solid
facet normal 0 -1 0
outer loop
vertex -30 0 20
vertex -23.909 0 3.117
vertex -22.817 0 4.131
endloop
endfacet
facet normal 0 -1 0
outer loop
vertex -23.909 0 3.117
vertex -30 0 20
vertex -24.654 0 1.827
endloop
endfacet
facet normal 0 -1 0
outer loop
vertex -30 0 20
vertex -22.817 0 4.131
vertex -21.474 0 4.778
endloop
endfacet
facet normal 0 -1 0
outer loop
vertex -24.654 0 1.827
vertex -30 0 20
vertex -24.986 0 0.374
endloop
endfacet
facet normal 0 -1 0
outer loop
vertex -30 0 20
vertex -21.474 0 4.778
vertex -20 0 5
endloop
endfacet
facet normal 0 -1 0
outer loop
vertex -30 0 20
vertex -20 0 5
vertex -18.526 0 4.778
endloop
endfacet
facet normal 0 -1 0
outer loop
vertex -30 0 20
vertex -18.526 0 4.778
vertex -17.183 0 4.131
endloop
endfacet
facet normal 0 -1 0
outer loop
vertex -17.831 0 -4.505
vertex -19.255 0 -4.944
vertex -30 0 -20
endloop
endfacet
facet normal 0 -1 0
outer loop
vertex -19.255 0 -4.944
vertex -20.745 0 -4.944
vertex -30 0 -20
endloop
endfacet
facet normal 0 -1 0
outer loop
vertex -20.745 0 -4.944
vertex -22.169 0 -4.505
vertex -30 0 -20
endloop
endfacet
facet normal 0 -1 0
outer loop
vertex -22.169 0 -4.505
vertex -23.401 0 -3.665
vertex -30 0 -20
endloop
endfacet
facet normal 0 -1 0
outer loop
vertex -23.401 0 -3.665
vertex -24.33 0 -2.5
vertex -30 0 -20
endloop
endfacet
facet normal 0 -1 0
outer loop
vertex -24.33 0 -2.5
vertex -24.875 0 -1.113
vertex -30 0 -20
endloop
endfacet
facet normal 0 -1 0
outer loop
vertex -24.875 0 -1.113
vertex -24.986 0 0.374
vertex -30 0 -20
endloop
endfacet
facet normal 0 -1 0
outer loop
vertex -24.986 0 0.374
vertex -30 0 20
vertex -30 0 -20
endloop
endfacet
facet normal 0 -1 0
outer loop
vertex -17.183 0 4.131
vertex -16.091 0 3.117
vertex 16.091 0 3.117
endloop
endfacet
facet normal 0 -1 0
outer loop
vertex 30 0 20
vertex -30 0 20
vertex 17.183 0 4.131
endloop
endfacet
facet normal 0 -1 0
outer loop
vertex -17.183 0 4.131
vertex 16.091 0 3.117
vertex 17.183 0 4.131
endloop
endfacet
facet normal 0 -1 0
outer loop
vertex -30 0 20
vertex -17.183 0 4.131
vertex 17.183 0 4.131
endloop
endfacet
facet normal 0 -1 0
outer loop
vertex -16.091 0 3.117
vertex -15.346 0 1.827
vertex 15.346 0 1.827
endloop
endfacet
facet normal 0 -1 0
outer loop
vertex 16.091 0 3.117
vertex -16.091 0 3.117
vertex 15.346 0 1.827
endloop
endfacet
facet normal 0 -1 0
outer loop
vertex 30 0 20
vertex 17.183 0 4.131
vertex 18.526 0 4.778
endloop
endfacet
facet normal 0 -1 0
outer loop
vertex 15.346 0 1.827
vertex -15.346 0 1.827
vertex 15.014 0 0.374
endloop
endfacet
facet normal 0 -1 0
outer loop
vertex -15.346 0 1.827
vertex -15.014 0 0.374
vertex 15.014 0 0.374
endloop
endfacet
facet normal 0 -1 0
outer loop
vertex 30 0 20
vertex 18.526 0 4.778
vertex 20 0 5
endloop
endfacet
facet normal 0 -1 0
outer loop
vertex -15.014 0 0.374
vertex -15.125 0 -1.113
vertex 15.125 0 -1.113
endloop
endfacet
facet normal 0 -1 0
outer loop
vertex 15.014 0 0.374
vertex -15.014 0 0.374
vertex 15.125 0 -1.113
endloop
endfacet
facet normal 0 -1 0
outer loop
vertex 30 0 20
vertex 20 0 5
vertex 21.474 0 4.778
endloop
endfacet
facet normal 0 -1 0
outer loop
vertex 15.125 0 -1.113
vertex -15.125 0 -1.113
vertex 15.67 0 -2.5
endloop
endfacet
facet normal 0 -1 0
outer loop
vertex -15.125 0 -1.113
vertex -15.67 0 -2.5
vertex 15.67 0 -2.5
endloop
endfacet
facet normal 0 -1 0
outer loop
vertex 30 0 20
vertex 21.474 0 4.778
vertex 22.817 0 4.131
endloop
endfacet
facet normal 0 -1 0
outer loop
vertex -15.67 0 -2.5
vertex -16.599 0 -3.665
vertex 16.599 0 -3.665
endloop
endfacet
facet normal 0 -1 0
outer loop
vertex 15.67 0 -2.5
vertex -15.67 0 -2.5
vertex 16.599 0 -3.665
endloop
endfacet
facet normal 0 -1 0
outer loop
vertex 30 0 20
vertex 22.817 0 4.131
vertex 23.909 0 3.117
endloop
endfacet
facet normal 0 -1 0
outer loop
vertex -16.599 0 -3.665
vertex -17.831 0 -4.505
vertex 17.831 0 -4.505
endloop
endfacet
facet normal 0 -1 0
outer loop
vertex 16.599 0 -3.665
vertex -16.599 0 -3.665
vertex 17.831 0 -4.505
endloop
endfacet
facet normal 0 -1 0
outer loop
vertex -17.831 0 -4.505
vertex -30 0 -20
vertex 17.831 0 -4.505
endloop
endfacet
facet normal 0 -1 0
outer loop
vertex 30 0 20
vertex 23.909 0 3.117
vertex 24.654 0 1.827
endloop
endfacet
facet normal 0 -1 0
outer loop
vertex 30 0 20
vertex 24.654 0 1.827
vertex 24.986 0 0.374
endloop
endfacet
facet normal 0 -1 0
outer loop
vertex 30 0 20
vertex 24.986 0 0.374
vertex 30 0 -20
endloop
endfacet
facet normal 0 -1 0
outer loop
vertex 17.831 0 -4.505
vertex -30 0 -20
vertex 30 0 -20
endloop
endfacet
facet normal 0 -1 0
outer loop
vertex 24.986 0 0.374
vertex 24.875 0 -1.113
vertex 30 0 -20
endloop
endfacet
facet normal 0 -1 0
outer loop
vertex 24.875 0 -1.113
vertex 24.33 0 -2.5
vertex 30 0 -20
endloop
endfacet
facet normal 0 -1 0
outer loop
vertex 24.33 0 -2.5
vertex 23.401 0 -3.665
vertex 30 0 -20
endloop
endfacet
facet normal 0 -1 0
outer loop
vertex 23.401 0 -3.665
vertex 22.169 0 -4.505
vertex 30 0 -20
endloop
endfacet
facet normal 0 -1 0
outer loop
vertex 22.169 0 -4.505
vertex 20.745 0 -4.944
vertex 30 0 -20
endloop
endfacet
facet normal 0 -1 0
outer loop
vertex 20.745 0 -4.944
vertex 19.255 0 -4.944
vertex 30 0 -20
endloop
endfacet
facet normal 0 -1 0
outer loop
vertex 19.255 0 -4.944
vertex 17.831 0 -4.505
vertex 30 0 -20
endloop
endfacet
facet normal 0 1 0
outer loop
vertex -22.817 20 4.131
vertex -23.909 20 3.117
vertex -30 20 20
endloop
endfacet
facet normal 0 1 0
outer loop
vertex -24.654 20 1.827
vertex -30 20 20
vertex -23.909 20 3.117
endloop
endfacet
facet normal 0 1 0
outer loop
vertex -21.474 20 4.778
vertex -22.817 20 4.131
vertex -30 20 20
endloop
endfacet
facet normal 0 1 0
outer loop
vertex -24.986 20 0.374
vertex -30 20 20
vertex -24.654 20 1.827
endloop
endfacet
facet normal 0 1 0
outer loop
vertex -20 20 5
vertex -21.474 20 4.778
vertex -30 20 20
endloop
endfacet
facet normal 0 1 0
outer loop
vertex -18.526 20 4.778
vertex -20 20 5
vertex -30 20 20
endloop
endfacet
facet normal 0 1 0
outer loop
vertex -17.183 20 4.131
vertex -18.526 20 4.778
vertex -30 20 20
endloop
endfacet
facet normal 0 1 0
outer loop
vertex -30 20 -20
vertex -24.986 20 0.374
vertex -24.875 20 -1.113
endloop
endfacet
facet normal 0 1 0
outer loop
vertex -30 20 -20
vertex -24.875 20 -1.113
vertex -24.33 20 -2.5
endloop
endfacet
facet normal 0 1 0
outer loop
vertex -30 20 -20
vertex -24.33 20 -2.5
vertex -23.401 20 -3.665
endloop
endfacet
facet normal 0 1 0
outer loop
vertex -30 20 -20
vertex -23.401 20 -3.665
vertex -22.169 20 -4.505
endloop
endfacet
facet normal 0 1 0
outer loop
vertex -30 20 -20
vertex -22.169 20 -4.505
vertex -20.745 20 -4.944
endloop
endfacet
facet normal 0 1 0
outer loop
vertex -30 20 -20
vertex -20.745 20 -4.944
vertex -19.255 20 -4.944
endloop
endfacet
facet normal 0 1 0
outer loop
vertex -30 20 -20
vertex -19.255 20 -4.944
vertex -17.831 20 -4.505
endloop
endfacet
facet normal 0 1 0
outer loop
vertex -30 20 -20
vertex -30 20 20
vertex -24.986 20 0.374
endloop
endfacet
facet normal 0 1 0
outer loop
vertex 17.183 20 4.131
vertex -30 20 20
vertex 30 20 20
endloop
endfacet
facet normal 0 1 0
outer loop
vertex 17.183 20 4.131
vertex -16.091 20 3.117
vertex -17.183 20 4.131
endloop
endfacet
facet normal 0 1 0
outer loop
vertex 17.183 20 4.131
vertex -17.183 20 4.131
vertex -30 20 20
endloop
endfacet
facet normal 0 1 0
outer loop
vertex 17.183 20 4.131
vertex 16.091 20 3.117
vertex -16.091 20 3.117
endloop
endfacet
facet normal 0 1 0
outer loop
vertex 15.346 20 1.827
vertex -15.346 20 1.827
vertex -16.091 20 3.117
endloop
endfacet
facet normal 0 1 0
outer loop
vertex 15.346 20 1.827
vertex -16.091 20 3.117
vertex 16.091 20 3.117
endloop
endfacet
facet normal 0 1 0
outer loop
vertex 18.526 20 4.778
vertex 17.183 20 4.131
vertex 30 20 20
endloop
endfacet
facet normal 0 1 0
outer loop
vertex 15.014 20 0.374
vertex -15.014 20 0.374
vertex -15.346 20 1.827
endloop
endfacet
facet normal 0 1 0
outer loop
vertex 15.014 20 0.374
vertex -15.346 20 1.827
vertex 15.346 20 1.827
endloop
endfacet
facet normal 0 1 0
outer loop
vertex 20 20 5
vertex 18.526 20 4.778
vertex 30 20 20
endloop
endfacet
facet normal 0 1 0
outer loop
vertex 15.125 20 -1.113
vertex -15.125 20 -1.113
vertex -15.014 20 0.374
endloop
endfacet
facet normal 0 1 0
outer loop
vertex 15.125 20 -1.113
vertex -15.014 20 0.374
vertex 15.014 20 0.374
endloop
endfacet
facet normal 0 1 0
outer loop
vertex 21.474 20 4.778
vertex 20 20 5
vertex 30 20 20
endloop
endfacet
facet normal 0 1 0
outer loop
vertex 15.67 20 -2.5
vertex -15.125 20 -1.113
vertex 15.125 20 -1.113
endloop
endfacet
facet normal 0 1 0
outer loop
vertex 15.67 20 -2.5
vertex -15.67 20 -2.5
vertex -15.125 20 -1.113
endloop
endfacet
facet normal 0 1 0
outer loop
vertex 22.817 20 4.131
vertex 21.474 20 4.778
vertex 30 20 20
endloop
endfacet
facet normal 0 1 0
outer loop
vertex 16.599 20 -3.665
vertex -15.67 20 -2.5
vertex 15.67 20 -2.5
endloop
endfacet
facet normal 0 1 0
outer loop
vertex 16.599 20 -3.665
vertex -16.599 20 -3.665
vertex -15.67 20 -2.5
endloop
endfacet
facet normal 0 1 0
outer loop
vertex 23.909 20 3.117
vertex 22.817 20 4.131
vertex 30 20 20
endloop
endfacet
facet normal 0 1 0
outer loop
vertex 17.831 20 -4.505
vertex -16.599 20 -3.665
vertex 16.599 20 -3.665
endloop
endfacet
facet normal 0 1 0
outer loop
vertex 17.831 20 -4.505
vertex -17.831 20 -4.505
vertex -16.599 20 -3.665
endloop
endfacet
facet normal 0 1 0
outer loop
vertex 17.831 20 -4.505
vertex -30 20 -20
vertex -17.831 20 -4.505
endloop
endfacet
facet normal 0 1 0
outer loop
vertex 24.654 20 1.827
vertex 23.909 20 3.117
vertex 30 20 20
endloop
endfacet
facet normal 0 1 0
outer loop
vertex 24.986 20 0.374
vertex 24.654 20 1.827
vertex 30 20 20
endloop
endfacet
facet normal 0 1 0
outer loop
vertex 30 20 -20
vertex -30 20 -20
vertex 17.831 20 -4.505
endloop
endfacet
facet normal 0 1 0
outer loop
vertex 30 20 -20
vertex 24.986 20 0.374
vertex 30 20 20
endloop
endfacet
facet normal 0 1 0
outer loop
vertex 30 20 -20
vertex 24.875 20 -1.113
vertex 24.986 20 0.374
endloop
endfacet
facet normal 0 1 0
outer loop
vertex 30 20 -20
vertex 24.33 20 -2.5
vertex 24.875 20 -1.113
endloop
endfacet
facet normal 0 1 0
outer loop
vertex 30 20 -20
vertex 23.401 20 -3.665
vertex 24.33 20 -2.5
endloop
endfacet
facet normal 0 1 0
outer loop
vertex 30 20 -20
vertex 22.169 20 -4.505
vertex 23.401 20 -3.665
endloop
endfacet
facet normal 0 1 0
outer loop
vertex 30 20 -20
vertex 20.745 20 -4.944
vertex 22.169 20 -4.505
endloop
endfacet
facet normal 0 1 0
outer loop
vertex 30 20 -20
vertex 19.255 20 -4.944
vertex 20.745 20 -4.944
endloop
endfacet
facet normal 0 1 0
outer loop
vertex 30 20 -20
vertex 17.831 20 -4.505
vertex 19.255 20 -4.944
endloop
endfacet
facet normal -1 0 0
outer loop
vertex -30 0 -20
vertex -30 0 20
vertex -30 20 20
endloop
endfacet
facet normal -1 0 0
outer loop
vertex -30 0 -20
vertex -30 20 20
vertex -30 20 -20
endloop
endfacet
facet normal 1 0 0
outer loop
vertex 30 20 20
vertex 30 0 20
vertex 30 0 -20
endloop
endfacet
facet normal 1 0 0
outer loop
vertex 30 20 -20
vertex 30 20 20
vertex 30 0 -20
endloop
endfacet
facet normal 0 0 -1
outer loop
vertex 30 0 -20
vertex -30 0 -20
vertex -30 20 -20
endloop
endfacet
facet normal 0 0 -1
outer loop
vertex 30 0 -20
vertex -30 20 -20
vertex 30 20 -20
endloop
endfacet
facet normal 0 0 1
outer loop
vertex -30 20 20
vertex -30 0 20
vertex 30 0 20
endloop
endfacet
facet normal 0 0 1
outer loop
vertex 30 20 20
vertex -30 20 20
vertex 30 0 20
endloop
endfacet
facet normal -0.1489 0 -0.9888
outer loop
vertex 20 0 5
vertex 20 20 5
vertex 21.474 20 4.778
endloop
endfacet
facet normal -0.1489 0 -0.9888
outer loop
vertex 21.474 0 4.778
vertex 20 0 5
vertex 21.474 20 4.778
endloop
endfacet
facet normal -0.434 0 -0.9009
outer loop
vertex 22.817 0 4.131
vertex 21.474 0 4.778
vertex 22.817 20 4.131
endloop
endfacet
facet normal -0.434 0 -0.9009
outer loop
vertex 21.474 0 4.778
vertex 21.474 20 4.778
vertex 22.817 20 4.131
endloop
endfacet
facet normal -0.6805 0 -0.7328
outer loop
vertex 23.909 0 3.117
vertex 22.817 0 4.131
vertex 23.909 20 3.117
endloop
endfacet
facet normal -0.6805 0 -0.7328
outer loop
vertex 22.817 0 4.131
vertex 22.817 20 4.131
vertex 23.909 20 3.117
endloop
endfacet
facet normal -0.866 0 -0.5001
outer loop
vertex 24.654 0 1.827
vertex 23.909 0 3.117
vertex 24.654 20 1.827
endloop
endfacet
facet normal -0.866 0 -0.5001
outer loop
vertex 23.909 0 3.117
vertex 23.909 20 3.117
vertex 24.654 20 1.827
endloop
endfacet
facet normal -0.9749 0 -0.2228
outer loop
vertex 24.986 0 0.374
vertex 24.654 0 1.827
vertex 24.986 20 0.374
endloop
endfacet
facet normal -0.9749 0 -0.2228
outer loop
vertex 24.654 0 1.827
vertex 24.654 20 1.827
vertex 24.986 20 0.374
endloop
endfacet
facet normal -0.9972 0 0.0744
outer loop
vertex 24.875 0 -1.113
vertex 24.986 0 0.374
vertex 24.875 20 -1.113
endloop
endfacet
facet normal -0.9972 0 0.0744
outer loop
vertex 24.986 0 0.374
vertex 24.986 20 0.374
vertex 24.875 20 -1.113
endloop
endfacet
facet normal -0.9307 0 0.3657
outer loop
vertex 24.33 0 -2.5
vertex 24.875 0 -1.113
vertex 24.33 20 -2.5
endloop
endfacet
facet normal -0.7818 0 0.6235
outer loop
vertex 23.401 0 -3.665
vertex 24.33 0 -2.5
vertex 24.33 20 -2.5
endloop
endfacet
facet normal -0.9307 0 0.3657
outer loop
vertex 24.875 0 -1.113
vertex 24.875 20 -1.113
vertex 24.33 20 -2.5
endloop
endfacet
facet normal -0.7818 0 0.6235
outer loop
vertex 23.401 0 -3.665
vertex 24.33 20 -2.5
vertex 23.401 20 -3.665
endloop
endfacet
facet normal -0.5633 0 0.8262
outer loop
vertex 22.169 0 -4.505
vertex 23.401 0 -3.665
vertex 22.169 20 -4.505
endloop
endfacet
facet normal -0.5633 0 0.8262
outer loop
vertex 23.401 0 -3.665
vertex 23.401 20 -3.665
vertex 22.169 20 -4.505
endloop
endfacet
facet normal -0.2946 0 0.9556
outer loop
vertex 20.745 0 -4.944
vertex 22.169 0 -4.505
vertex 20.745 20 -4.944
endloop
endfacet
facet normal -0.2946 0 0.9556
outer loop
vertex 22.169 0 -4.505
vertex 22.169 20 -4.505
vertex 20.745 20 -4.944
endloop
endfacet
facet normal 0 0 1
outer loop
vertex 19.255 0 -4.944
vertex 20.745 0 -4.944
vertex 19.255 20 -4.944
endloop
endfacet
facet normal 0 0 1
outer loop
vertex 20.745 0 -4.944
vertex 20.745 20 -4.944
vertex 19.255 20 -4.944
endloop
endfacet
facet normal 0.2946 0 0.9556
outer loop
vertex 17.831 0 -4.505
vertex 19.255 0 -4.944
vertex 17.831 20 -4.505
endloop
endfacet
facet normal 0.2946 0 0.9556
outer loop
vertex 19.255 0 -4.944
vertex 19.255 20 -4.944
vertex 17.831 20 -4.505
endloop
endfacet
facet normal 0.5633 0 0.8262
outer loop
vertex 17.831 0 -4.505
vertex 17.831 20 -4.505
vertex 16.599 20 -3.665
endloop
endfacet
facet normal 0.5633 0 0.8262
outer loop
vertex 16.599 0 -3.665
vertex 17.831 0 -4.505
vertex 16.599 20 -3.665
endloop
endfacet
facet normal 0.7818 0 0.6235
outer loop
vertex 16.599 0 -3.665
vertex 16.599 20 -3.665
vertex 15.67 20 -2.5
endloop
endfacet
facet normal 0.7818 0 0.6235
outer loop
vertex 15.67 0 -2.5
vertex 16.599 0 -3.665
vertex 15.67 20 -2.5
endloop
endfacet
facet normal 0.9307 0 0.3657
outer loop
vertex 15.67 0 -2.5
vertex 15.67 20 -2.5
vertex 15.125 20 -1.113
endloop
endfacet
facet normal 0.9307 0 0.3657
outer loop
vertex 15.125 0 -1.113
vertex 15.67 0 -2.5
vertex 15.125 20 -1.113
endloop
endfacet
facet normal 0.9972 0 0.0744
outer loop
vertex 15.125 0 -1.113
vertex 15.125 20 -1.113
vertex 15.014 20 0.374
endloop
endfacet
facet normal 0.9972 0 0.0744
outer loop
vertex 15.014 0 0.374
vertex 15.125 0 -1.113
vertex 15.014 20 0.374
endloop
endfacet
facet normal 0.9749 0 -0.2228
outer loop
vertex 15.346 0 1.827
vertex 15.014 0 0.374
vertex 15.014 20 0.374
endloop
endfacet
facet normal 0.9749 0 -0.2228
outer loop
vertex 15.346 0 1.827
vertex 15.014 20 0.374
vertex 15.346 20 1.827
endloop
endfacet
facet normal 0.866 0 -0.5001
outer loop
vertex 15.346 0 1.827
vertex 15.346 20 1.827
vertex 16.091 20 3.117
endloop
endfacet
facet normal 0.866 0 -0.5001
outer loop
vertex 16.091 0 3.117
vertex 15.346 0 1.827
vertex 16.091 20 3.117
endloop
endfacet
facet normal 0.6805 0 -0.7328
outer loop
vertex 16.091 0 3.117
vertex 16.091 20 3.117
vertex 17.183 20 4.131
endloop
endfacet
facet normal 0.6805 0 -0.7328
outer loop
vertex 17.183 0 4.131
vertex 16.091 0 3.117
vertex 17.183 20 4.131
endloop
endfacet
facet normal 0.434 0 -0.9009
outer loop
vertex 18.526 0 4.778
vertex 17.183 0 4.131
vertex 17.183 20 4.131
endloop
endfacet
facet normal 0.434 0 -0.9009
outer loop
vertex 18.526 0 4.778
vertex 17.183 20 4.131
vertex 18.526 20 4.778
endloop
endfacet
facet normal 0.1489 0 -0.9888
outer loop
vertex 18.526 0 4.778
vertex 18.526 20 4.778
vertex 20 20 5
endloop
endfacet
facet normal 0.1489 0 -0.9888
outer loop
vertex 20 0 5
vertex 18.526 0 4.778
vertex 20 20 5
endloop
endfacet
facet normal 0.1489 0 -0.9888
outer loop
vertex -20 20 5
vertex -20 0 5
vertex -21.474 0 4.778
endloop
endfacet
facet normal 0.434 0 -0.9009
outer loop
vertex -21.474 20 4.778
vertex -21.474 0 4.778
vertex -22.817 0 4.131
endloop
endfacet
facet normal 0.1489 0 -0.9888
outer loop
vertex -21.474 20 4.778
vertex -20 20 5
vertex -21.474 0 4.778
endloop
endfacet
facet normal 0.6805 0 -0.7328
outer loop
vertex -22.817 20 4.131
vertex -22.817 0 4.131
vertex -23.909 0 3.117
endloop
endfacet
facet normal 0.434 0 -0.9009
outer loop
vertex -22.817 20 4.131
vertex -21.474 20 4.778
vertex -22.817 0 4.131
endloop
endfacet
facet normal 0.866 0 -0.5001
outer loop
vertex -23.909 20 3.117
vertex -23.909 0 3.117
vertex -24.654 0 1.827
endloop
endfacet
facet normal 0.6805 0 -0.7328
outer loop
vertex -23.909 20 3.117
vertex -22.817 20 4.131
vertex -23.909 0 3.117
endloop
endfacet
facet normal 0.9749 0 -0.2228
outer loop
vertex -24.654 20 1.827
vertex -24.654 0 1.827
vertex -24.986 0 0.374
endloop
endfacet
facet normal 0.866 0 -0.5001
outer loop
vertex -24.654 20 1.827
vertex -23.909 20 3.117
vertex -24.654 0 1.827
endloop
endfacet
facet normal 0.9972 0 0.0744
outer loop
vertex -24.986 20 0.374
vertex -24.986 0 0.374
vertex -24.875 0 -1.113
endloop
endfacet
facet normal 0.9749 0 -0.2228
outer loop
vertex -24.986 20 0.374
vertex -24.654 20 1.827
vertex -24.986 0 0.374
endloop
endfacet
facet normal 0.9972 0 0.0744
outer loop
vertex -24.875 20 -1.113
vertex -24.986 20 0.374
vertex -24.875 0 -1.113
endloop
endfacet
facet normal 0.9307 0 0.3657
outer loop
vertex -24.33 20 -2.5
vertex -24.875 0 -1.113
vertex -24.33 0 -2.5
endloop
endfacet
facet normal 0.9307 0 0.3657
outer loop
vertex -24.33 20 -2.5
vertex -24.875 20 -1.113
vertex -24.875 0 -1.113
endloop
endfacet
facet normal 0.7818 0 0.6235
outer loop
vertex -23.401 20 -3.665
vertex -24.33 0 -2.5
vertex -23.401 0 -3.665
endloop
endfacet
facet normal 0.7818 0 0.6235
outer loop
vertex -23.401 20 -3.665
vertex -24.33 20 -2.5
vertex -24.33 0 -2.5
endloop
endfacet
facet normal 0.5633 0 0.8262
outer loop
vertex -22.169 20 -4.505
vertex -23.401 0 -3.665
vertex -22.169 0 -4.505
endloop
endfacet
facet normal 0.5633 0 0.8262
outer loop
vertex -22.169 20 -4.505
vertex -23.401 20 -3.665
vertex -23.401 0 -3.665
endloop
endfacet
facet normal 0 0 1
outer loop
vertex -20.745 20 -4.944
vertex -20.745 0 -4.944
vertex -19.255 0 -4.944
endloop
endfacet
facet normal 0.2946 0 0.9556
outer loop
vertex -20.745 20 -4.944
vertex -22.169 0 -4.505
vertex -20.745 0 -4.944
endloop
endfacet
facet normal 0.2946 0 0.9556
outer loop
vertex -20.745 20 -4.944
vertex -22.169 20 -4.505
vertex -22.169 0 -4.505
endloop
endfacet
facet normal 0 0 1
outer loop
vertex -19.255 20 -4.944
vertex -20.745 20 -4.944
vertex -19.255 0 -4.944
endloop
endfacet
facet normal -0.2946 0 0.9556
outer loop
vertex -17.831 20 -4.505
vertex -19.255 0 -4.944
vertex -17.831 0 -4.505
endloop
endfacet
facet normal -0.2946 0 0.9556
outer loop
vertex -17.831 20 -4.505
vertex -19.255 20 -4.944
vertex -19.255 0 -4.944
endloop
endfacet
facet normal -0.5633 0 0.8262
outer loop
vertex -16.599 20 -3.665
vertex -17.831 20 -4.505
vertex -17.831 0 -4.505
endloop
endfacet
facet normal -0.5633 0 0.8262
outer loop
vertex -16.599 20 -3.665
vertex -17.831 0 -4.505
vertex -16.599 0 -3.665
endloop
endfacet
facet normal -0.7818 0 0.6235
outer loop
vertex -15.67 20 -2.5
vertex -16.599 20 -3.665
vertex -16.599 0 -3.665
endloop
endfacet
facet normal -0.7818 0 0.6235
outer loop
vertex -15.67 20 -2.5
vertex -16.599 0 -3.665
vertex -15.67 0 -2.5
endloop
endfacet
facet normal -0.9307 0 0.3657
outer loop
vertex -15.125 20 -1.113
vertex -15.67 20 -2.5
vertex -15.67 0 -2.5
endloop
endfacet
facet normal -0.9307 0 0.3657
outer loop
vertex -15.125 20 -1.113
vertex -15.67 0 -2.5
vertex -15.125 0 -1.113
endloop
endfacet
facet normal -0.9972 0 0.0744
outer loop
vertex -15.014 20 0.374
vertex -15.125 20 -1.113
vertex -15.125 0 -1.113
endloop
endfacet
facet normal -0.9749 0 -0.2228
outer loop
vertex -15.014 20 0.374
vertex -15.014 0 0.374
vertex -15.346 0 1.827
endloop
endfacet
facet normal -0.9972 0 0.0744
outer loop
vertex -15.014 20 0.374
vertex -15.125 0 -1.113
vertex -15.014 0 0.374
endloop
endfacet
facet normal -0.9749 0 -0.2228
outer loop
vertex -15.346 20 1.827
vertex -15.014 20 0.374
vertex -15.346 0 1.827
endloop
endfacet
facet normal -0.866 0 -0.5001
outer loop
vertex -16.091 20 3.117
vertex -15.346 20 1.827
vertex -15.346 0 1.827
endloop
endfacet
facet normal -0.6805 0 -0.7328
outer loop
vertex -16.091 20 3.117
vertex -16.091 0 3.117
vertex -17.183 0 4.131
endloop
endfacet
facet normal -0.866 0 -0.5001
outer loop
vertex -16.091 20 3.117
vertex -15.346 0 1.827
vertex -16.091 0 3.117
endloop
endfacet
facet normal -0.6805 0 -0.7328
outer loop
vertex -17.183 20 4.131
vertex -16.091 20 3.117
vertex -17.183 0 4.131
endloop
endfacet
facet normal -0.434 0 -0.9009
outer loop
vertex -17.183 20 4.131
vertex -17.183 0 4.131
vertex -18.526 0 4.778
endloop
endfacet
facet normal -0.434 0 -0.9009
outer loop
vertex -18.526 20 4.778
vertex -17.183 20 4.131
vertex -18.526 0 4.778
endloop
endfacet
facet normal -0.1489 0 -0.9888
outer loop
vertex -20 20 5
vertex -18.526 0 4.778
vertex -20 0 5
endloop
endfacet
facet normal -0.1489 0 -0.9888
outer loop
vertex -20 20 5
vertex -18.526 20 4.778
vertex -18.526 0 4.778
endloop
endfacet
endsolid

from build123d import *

# Parameters (mm, degrees)
SKETCH1_W           = 60
SKETCH1_H           = 40
BOSS_EXTRUDE1_DEPTH = 20
SKETCH2_R           = 5
CUT_EXTRUDE1_DEPTH  = 42.231056256


with BuildPart() as part:
    # Sketch1 → Boss-Extrude1 (new body)
    with BuildSketch(Plane(origin=(0, 0, 0), x_dir=(1, 0, 0), z_dir=(0, 1, 0))):
        Rectangle(SKETCH1_W, SKETCH1_H)
    extrude(amount=BOSS_EXTRUDE1_DEPTH)

    # Sketch2 → Cut-Extrude1 (cut, through all)
    with BuildSketch(Plane(origin=(0, 20, 0), x_dir=(1, 0, 0), z_dir=(0, 1, 0))):
        with Locations(Location((20, 0, 0), (0, 0, 270))):
            Circle(SKETCH2_R)
    cut_extrude1 = extrude(amount=-CUT_EXTRUDE1_DEPTH, mode=Mode.SUBTRACT)

    # Mirror1: Cut-Extrude1 across plane
    add(cut_extrude1.mirror(Plane(origin=(0, 0, 0), x_dir=(0, 0, 1), z_dir=(1, 0, 0))), mode=Mode.SUBTRACT)


solid = part.part
